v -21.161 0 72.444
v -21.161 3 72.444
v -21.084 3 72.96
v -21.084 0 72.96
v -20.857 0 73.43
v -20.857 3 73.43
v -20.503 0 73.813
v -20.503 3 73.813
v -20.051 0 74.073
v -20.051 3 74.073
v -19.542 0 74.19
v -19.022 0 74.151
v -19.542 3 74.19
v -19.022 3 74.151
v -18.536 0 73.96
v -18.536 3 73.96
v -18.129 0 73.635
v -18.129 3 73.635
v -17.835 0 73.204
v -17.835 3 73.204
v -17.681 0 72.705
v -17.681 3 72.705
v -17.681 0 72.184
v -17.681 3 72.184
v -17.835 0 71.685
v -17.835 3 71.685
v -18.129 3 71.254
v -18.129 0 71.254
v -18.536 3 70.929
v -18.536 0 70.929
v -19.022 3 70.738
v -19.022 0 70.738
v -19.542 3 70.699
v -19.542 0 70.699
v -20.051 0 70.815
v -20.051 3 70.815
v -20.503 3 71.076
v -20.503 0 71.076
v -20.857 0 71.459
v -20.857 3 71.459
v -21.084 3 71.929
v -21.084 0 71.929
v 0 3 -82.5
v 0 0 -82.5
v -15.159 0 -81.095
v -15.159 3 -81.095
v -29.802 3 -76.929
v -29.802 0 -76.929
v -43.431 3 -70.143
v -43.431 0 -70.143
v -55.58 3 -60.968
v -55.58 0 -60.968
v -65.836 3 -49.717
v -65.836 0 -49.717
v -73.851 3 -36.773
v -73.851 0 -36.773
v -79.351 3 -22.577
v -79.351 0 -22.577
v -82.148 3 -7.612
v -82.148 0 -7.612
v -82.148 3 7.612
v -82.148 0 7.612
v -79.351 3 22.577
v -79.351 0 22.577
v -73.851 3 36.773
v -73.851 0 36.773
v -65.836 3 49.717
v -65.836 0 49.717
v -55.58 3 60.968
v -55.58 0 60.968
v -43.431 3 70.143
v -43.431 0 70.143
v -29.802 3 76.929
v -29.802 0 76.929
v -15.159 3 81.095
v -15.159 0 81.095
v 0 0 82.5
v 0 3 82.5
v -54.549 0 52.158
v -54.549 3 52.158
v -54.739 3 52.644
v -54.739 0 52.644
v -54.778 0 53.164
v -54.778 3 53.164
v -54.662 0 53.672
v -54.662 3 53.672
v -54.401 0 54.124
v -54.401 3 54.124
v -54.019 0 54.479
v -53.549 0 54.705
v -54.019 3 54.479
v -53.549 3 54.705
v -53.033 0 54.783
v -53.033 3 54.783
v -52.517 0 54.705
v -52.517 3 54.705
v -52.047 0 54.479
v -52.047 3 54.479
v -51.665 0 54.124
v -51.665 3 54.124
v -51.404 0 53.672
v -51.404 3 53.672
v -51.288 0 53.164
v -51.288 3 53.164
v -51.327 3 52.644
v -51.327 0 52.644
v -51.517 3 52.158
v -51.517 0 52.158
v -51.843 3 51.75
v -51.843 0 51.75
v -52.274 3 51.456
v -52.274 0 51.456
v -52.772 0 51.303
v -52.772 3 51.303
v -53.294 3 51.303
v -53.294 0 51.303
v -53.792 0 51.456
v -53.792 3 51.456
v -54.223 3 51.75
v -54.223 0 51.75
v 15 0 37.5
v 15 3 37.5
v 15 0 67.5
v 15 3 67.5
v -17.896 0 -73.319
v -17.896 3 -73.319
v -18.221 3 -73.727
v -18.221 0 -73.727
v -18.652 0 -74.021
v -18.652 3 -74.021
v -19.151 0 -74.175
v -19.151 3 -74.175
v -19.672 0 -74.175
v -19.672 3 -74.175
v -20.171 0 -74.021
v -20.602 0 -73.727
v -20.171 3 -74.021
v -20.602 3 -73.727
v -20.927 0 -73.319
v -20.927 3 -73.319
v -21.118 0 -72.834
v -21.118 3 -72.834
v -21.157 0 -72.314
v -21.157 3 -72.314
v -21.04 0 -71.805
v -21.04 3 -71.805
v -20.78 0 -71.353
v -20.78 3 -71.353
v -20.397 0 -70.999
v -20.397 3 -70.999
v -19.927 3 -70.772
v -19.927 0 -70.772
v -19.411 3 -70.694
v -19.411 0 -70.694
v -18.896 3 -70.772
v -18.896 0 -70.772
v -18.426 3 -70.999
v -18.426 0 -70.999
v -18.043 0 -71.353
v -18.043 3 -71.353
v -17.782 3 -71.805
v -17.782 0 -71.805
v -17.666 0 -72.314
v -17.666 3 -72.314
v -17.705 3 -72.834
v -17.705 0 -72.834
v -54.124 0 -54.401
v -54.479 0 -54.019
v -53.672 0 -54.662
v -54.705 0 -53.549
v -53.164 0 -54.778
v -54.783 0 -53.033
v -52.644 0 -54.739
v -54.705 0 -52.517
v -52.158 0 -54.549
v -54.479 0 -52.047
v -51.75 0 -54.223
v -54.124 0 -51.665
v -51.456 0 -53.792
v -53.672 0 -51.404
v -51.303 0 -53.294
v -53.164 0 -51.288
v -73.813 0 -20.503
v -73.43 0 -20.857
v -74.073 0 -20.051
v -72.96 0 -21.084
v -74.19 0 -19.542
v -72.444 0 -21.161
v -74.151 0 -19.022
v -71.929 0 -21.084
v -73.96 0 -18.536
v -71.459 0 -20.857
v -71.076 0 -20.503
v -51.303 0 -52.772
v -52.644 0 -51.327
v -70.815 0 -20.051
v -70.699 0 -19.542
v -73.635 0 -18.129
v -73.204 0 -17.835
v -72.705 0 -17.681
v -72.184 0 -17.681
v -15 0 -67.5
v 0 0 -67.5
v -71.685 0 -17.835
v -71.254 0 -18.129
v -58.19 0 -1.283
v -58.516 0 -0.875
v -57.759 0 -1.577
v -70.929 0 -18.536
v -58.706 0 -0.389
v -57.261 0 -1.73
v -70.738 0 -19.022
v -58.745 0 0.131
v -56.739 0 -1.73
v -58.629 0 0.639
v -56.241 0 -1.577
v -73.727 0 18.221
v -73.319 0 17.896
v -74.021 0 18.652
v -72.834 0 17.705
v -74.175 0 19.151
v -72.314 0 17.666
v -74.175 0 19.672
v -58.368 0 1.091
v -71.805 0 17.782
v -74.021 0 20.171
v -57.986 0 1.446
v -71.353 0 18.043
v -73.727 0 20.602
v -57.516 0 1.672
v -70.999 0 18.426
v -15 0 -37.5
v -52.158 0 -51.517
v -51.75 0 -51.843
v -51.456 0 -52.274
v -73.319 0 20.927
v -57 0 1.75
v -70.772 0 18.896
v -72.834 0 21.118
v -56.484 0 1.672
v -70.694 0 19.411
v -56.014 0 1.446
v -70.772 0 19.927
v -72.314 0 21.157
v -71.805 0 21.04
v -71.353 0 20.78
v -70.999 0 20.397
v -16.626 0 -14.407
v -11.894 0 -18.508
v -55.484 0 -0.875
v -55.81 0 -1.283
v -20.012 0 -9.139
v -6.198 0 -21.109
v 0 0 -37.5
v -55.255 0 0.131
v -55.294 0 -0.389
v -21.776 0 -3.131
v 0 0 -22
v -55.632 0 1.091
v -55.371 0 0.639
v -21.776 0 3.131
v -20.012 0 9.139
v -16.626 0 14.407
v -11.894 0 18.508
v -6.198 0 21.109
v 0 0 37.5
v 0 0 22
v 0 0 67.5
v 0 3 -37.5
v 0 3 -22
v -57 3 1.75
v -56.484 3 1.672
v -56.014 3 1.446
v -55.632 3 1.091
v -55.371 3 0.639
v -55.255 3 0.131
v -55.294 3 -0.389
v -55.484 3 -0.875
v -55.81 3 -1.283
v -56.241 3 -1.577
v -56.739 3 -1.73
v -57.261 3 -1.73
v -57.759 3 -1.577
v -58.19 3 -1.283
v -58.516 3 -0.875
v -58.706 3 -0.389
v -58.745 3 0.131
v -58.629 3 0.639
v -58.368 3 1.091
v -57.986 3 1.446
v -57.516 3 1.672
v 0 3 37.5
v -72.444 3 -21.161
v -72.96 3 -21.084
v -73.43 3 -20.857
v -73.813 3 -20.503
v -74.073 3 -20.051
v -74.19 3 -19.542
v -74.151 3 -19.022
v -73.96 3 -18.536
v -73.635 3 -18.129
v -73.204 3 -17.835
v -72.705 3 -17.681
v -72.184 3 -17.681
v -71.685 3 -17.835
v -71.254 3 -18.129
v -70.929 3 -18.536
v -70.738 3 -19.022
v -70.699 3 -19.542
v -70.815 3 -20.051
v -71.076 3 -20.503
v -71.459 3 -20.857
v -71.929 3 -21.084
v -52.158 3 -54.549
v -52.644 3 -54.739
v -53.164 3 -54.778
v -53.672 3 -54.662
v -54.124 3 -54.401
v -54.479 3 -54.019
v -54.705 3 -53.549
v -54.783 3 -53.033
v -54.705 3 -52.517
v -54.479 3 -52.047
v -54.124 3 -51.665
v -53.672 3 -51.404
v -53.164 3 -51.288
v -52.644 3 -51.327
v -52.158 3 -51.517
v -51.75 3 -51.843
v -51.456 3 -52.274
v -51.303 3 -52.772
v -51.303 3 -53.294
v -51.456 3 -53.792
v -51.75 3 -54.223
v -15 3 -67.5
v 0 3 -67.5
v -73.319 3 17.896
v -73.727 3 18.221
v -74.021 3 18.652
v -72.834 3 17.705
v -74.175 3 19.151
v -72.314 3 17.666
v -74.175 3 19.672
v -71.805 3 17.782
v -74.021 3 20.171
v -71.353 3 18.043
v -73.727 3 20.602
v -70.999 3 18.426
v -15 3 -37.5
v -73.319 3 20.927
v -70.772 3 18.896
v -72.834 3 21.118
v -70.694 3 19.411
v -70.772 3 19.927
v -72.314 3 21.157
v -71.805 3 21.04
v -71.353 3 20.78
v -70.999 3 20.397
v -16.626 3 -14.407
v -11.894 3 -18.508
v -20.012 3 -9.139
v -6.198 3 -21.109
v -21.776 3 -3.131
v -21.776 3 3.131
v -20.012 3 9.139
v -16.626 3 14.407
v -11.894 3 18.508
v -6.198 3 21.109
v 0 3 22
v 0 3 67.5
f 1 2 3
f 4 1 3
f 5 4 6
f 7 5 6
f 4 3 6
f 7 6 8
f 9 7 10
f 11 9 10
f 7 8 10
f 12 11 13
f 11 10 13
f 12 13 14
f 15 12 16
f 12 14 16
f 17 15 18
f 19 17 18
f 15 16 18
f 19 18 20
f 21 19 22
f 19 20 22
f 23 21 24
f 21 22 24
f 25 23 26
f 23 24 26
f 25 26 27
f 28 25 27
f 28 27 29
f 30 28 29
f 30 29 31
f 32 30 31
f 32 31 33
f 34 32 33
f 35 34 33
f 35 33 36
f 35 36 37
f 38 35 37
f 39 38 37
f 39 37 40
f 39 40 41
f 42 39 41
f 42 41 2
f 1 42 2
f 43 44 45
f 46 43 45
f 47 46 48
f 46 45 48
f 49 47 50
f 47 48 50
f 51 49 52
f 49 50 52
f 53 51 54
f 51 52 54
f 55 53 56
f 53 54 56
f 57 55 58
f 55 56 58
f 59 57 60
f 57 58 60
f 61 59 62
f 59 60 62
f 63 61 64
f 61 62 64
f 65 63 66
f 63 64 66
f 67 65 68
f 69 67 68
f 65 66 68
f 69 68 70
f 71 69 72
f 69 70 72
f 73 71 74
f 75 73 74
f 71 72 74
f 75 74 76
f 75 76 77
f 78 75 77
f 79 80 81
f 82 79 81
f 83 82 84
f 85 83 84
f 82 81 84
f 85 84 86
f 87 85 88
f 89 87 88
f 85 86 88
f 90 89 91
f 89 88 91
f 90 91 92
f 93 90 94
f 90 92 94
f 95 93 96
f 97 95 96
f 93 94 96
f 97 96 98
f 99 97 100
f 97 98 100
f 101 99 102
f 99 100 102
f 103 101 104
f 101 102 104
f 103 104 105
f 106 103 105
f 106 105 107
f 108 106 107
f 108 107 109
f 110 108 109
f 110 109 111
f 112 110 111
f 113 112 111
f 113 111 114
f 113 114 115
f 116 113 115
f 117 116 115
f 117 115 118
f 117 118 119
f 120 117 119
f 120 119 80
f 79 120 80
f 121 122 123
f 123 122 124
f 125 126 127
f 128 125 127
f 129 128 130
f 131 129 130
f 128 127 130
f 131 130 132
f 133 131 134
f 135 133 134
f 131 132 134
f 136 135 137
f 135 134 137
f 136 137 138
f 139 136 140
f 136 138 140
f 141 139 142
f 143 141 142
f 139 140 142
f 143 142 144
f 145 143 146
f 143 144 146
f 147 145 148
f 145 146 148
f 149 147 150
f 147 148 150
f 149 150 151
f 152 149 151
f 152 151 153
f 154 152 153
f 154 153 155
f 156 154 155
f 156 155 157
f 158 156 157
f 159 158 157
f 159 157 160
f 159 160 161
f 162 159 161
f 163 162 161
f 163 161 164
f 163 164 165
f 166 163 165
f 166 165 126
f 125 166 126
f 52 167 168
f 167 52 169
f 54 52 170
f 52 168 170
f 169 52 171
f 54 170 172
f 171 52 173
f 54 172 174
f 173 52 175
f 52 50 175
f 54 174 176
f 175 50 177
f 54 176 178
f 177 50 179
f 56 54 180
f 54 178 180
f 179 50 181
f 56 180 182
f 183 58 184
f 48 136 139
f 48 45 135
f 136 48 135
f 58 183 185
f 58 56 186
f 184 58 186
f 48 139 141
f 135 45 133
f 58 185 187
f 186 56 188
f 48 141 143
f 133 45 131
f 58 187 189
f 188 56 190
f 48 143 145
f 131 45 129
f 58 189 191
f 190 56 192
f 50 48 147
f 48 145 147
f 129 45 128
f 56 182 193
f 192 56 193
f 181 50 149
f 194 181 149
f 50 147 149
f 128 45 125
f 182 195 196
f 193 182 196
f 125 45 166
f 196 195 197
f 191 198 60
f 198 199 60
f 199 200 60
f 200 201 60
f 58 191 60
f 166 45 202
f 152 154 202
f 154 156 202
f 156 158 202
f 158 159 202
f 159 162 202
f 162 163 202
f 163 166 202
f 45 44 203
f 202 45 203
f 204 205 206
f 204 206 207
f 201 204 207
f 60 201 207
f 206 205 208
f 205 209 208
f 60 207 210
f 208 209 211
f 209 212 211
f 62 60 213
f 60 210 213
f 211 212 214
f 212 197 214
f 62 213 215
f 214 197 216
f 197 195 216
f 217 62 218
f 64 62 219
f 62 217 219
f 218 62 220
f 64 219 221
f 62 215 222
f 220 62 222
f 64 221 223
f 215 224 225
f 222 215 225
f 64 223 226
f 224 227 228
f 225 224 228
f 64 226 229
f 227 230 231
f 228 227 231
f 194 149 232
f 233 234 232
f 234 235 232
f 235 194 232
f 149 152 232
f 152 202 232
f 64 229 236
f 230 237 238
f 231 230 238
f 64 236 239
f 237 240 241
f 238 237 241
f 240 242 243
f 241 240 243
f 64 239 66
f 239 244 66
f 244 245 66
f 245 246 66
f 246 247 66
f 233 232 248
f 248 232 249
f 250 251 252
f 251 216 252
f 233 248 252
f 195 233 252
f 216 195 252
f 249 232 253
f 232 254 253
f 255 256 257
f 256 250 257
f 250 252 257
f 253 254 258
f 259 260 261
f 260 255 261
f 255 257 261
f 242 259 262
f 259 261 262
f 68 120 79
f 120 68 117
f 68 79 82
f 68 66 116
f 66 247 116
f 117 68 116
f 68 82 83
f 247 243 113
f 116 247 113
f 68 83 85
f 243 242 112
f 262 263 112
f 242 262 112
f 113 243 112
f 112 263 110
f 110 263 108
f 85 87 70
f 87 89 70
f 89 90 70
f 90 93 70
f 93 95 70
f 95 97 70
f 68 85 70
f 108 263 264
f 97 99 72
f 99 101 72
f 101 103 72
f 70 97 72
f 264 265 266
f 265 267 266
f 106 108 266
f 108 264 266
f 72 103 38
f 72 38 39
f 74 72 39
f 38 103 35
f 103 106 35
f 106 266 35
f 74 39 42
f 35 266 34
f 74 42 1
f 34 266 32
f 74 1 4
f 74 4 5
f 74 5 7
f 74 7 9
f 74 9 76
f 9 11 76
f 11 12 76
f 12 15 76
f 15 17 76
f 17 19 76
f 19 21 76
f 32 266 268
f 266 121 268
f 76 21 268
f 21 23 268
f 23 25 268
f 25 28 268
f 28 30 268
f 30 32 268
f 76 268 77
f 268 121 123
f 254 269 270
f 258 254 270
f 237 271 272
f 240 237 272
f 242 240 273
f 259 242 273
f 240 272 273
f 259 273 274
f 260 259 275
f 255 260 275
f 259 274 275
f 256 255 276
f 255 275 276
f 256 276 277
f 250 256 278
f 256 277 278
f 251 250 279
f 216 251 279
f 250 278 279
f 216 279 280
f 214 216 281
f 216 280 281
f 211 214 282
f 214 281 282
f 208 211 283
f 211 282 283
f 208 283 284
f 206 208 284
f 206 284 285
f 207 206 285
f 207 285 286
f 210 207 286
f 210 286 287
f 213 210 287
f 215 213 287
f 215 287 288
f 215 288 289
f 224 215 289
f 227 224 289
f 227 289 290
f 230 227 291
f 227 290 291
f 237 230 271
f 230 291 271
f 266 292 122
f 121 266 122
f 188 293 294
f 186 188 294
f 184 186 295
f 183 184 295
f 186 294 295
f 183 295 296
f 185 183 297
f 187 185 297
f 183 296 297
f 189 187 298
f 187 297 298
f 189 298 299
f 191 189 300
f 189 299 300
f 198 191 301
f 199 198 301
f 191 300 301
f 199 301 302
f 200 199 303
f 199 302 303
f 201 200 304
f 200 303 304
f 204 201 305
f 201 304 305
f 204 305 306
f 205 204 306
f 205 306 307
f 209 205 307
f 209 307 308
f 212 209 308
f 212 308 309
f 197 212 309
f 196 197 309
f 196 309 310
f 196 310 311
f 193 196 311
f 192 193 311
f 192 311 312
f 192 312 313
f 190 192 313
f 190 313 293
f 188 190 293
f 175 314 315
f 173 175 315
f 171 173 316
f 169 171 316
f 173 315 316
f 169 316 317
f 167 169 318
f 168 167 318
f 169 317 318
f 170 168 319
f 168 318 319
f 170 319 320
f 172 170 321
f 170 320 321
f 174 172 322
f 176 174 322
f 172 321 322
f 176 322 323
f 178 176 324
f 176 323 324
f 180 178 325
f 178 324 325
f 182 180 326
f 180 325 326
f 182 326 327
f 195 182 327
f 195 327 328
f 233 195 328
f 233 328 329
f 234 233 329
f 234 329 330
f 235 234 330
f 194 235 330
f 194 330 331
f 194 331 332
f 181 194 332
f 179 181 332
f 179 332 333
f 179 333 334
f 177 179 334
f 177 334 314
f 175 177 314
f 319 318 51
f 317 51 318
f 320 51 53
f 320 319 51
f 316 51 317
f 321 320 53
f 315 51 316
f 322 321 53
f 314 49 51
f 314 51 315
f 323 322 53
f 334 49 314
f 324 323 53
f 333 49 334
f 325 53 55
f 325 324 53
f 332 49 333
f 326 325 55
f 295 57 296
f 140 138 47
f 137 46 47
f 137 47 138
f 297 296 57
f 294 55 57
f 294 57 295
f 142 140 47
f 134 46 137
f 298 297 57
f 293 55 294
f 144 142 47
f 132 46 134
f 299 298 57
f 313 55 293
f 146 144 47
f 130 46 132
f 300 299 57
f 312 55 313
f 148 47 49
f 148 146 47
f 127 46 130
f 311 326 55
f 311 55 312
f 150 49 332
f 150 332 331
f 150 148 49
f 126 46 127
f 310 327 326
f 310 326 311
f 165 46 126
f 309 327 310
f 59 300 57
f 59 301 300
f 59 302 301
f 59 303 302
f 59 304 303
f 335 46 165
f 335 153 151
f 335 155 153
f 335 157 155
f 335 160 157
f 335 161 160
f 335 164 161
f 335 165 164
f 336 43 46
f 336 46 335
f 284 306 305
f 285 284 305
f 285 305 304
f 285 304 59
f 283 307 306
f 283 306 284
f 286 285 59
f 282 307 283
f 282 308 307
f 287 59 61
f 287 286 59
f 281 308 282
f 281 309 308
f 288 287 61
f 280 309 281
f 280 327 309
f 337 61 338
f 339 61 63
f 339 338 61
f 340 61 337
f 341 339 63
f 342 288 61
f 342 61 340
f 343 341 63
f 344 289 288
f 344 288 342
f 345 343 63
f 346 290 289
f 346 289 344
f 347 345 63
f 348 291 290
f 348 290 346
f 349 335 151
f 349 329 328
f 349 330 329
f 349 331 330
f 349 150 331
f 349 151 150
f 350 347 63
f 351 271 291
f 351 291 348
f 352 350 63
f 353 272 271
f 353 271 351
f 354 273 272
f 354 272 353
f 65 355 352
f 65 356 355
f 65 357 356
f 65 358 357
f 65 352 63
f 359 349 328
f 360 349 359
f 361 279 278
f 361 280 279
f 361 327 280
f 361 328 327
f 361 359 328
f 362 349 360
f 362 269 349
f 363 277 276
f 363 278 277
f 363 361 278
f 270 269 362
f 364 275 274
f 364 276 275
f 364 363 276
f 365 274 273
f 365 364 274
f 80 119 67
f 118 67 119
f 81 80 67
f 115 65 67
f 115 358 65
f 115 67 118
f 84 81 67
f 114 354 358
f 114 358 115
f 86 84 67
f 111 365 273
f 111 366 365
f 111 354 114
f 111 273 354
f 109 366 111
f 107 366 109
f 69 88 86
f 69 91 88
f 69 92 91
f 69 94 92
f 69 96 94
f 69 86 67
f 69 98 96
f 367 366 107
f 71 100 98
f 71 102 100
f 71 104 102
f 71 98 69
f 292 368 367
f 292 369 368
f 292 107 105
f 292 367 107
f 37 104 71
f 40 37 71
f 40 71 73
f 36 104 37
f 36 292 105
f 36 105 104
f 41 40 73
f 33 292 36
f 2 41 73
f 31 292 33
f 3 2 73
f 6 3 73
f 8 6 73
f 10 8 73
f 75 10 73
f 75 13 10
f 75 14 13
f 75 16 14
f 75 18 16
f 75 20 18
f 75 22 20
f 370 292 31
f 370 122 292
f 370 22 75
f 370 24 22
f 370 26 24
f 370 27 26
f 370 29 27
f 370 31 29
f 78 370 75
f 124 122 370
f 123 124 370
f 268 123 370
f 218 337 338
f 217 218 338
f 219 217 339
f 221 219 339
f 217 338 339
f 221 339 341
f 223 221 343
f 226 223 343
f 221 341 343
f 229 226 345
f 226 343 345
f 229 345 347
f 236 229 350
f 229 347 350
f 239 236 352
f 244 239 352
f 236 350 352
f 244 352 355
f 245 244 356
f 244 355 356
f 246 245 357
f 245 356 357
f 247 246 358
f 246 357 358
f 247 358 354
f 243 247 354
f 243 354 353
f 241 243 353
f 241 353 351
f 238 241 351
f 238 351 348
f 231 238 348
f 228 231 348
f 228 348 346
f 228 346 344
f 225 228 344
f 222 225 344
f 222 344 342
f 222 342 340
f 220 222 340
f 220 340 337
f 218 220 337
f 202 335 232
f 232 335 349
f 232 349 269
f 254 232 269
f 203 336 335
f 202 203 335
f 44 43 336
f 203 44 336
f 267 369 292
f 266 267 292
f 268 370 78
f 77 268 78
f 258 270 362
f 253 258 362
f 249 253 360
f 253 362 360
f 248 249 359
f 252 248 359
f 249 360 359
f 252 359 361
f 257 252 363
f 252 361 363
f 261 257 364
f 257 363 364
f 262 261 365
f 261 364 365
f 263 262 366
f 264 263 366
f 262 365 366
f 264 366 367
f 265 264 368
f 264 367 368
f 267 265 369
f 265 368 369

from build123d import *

# Parameters (mm, degrees)
SKETCH1_R           = 82.5
BOSS_EXTRUDE1_DEPTH = 3
SKETCH2_R           = 1.75
SKETCH2_R_2         = 22
CUT_EXTRUDE1_DEPTH  = 3
SKETCH3_R           = 1.75
CUT_EXTRUDE2_DEPTH  = 117.711181984
CIRPATTERN1_COUNT   = 12
CUT_EXTRUDE3_DEPTH  = 3


with BuildPart() as part:
    # Sketch1 → Boss-Extrude1 (new body)
    with BuildSketch(Plane(origin=(0, 0, 0), x_dir=(1, 0, 0), z_dir=(0, 1, 0))):
        with Locations(Location((0, 0, 0), (0, 0, 270))):
            Circle(SKETCH1_R)
    extrude(amount=BOSS_EXTRUDE1_DEPTH)

    # Sketch2 → Cut-Extrude1 (cut)
    with BuildSketch(Plane(origin=(0, 3, 0), x_dir=(1, 0, 0), z_dir=(0, 1, 0))):
        with Locations(Location((57, 0, 0), (0, 0, 270))):
            Circle(SKETCH2_R)
        with Locations(Location((0, 0, 0), (0, 0, 270))):
            Circle(SKETCH2_R_2)
        with Locations(Location((-57, 0, 0), (0, 0, 270))):
            Circle(SKETCH2_R)
    extrude(amount=-CUT_EXTRUDE1_DEPTH, mode=Mode.SUBTRACT)

    # Sketch3 → Cut-Extrude2 (cut, through all)
    with BuildSketch(Plane(origin=(0, 3, 0), x_dir=(1, 0, 0), z_dir=(0, 1, 0))):
        with Locations(Location((72.444436972, -19.411428383, 0), (0, 0, 270))):
            Circle(SKETCH3_R)
    cut_extrude2 = extrude(amount=-CUT_EXTRUDE2_DEPTH, mode=Mode.SUBTRACT)

    # CirPattern1: Cut-Extrude2 ×12 about axis
    cirpattern1_axis = Axis((0, 0, 0), (0, 1, 0))
    for i in range(1, CIRPATTERN1_COUNT):
        add(cut_extrude2.rotate(cirpattern1_axis, i * 360 / CIRPATTERN1_COUNT), mode=Mode.SUBTRACT)

    # Sketch4 → Cut-Extrude3 (cut)
    with BuildSketch(Plane(origin=(0, 3, 0), x_dir=(1, 0, 0), z_dir=(0, 1, 0))):
        with BuildLine():
            Line((0, 67.5), (-15, 67.5))
            Line((-15, 67.5), (-15, 37.5))
            Line((-15, 37.5), (0, 37.5))
            Line((0, 37.5), (0, 22))
            ThreePointArc((0, 22), (22, 0), (0, -22))
            Line((0, -22), (0, -37.5))
            Line((0, -37.5), (15, -37.5))
            Line((15, -37.5), (15, -67.5))
            Line((15, -67.5), (0, -67.5))
            Line((0, -67.5), (0, -82.5))
            ThreePointArc((0, -82.5), (82.5, 0), (0, 82.5))
            Line((0, 82.5), (0, 67.5))
        make_face()
    extrude(amount=-CUT_EXTRUDE3_DEPTH, mode=Mode.SUBTRACT)


solid = part.part
